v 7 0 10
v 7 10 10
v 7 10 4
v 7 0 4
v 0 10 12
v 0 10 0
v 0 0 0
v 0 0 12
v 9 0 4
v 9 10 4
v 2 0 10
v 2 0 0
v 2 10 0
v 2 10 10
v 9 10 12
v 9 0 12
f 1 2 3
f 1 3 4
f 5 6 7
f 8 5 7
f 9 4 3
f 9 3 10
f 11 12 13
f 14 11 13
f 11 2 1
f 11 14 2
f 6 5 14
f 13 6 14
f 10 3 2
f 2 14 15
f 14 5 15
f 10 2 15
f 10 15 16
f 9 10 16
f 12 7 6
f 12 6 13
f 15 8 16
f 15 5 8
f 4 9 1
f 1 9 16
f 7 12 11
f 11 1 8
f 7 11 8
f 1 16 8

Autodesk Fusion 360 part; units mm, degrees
sketch "Sketch1" plane through (0, 0, 0) normal (0, 0, 1) x (1, 0, 0)
  line L0 (0, 0) -> (2, 0)
  line L1 (2, 0) -> (2, 10)
  line L2 (2, 10) -> (0, 10)
  line L3 (0, 10) -> (0, 0)
  dimension "d4" = 10
  dimension "d5" = 2
extrude "Extrude1" add sketch "Sketch1" along normal blind 12
sketch "Sketch2" plane through (2, 0, 0) normal (1, 0, 0) x (0, 1, 0)
  line L0 (0, 0) -> (10, 0)
  line L1 (10, 0) -> (10, 12)
  line L2 (10, 12) -> (0, 12)
  line L3 (0, 12) -> (0, 0)
  line L4 (0, 12) -> (10, 12)
  line L5 (10, 12) -> (10, 10)
  line L6 (10, 10) -> (0, 10)
  line L7 (0, 10) -> (0, 12)
  dimension "d8" = 2
extrude "Extrude2" add sketch "Sketch2" along normal blind 7 contours L1 L2 L3 L4 L5 L6 L7
sketch "Sketch3" plane through (0, 0, 10) normal (0, 0, -1) x (1, 0, 0)
  line L0 (2, 0) -> (2, -10)
  line L1 (2, -10) -> (9, -10)
  line L2 (9, -10) -> (9, 0)
  line L3 (9, 0) -> (2, 0)
  line L4 (9, -10) -> (7, -10)
  line L5 (7, -10) -> (7, 0)
  line L6 (7, 0) -> (9, 0)
  line L7 (9, 0) -> (9, -10)
  dimension "d11" = 2
extrude "Extrude3" add sketch "Sketch3" along normal blind 6 contours L1 L2 L3 L4 L5 L6 L7
equation "width = 10 mm"
equation "length = 2 mm"
equation "height = 12 mm"
equation "d4 = width"
equation "d5 = length"
equation "d6 = height"
